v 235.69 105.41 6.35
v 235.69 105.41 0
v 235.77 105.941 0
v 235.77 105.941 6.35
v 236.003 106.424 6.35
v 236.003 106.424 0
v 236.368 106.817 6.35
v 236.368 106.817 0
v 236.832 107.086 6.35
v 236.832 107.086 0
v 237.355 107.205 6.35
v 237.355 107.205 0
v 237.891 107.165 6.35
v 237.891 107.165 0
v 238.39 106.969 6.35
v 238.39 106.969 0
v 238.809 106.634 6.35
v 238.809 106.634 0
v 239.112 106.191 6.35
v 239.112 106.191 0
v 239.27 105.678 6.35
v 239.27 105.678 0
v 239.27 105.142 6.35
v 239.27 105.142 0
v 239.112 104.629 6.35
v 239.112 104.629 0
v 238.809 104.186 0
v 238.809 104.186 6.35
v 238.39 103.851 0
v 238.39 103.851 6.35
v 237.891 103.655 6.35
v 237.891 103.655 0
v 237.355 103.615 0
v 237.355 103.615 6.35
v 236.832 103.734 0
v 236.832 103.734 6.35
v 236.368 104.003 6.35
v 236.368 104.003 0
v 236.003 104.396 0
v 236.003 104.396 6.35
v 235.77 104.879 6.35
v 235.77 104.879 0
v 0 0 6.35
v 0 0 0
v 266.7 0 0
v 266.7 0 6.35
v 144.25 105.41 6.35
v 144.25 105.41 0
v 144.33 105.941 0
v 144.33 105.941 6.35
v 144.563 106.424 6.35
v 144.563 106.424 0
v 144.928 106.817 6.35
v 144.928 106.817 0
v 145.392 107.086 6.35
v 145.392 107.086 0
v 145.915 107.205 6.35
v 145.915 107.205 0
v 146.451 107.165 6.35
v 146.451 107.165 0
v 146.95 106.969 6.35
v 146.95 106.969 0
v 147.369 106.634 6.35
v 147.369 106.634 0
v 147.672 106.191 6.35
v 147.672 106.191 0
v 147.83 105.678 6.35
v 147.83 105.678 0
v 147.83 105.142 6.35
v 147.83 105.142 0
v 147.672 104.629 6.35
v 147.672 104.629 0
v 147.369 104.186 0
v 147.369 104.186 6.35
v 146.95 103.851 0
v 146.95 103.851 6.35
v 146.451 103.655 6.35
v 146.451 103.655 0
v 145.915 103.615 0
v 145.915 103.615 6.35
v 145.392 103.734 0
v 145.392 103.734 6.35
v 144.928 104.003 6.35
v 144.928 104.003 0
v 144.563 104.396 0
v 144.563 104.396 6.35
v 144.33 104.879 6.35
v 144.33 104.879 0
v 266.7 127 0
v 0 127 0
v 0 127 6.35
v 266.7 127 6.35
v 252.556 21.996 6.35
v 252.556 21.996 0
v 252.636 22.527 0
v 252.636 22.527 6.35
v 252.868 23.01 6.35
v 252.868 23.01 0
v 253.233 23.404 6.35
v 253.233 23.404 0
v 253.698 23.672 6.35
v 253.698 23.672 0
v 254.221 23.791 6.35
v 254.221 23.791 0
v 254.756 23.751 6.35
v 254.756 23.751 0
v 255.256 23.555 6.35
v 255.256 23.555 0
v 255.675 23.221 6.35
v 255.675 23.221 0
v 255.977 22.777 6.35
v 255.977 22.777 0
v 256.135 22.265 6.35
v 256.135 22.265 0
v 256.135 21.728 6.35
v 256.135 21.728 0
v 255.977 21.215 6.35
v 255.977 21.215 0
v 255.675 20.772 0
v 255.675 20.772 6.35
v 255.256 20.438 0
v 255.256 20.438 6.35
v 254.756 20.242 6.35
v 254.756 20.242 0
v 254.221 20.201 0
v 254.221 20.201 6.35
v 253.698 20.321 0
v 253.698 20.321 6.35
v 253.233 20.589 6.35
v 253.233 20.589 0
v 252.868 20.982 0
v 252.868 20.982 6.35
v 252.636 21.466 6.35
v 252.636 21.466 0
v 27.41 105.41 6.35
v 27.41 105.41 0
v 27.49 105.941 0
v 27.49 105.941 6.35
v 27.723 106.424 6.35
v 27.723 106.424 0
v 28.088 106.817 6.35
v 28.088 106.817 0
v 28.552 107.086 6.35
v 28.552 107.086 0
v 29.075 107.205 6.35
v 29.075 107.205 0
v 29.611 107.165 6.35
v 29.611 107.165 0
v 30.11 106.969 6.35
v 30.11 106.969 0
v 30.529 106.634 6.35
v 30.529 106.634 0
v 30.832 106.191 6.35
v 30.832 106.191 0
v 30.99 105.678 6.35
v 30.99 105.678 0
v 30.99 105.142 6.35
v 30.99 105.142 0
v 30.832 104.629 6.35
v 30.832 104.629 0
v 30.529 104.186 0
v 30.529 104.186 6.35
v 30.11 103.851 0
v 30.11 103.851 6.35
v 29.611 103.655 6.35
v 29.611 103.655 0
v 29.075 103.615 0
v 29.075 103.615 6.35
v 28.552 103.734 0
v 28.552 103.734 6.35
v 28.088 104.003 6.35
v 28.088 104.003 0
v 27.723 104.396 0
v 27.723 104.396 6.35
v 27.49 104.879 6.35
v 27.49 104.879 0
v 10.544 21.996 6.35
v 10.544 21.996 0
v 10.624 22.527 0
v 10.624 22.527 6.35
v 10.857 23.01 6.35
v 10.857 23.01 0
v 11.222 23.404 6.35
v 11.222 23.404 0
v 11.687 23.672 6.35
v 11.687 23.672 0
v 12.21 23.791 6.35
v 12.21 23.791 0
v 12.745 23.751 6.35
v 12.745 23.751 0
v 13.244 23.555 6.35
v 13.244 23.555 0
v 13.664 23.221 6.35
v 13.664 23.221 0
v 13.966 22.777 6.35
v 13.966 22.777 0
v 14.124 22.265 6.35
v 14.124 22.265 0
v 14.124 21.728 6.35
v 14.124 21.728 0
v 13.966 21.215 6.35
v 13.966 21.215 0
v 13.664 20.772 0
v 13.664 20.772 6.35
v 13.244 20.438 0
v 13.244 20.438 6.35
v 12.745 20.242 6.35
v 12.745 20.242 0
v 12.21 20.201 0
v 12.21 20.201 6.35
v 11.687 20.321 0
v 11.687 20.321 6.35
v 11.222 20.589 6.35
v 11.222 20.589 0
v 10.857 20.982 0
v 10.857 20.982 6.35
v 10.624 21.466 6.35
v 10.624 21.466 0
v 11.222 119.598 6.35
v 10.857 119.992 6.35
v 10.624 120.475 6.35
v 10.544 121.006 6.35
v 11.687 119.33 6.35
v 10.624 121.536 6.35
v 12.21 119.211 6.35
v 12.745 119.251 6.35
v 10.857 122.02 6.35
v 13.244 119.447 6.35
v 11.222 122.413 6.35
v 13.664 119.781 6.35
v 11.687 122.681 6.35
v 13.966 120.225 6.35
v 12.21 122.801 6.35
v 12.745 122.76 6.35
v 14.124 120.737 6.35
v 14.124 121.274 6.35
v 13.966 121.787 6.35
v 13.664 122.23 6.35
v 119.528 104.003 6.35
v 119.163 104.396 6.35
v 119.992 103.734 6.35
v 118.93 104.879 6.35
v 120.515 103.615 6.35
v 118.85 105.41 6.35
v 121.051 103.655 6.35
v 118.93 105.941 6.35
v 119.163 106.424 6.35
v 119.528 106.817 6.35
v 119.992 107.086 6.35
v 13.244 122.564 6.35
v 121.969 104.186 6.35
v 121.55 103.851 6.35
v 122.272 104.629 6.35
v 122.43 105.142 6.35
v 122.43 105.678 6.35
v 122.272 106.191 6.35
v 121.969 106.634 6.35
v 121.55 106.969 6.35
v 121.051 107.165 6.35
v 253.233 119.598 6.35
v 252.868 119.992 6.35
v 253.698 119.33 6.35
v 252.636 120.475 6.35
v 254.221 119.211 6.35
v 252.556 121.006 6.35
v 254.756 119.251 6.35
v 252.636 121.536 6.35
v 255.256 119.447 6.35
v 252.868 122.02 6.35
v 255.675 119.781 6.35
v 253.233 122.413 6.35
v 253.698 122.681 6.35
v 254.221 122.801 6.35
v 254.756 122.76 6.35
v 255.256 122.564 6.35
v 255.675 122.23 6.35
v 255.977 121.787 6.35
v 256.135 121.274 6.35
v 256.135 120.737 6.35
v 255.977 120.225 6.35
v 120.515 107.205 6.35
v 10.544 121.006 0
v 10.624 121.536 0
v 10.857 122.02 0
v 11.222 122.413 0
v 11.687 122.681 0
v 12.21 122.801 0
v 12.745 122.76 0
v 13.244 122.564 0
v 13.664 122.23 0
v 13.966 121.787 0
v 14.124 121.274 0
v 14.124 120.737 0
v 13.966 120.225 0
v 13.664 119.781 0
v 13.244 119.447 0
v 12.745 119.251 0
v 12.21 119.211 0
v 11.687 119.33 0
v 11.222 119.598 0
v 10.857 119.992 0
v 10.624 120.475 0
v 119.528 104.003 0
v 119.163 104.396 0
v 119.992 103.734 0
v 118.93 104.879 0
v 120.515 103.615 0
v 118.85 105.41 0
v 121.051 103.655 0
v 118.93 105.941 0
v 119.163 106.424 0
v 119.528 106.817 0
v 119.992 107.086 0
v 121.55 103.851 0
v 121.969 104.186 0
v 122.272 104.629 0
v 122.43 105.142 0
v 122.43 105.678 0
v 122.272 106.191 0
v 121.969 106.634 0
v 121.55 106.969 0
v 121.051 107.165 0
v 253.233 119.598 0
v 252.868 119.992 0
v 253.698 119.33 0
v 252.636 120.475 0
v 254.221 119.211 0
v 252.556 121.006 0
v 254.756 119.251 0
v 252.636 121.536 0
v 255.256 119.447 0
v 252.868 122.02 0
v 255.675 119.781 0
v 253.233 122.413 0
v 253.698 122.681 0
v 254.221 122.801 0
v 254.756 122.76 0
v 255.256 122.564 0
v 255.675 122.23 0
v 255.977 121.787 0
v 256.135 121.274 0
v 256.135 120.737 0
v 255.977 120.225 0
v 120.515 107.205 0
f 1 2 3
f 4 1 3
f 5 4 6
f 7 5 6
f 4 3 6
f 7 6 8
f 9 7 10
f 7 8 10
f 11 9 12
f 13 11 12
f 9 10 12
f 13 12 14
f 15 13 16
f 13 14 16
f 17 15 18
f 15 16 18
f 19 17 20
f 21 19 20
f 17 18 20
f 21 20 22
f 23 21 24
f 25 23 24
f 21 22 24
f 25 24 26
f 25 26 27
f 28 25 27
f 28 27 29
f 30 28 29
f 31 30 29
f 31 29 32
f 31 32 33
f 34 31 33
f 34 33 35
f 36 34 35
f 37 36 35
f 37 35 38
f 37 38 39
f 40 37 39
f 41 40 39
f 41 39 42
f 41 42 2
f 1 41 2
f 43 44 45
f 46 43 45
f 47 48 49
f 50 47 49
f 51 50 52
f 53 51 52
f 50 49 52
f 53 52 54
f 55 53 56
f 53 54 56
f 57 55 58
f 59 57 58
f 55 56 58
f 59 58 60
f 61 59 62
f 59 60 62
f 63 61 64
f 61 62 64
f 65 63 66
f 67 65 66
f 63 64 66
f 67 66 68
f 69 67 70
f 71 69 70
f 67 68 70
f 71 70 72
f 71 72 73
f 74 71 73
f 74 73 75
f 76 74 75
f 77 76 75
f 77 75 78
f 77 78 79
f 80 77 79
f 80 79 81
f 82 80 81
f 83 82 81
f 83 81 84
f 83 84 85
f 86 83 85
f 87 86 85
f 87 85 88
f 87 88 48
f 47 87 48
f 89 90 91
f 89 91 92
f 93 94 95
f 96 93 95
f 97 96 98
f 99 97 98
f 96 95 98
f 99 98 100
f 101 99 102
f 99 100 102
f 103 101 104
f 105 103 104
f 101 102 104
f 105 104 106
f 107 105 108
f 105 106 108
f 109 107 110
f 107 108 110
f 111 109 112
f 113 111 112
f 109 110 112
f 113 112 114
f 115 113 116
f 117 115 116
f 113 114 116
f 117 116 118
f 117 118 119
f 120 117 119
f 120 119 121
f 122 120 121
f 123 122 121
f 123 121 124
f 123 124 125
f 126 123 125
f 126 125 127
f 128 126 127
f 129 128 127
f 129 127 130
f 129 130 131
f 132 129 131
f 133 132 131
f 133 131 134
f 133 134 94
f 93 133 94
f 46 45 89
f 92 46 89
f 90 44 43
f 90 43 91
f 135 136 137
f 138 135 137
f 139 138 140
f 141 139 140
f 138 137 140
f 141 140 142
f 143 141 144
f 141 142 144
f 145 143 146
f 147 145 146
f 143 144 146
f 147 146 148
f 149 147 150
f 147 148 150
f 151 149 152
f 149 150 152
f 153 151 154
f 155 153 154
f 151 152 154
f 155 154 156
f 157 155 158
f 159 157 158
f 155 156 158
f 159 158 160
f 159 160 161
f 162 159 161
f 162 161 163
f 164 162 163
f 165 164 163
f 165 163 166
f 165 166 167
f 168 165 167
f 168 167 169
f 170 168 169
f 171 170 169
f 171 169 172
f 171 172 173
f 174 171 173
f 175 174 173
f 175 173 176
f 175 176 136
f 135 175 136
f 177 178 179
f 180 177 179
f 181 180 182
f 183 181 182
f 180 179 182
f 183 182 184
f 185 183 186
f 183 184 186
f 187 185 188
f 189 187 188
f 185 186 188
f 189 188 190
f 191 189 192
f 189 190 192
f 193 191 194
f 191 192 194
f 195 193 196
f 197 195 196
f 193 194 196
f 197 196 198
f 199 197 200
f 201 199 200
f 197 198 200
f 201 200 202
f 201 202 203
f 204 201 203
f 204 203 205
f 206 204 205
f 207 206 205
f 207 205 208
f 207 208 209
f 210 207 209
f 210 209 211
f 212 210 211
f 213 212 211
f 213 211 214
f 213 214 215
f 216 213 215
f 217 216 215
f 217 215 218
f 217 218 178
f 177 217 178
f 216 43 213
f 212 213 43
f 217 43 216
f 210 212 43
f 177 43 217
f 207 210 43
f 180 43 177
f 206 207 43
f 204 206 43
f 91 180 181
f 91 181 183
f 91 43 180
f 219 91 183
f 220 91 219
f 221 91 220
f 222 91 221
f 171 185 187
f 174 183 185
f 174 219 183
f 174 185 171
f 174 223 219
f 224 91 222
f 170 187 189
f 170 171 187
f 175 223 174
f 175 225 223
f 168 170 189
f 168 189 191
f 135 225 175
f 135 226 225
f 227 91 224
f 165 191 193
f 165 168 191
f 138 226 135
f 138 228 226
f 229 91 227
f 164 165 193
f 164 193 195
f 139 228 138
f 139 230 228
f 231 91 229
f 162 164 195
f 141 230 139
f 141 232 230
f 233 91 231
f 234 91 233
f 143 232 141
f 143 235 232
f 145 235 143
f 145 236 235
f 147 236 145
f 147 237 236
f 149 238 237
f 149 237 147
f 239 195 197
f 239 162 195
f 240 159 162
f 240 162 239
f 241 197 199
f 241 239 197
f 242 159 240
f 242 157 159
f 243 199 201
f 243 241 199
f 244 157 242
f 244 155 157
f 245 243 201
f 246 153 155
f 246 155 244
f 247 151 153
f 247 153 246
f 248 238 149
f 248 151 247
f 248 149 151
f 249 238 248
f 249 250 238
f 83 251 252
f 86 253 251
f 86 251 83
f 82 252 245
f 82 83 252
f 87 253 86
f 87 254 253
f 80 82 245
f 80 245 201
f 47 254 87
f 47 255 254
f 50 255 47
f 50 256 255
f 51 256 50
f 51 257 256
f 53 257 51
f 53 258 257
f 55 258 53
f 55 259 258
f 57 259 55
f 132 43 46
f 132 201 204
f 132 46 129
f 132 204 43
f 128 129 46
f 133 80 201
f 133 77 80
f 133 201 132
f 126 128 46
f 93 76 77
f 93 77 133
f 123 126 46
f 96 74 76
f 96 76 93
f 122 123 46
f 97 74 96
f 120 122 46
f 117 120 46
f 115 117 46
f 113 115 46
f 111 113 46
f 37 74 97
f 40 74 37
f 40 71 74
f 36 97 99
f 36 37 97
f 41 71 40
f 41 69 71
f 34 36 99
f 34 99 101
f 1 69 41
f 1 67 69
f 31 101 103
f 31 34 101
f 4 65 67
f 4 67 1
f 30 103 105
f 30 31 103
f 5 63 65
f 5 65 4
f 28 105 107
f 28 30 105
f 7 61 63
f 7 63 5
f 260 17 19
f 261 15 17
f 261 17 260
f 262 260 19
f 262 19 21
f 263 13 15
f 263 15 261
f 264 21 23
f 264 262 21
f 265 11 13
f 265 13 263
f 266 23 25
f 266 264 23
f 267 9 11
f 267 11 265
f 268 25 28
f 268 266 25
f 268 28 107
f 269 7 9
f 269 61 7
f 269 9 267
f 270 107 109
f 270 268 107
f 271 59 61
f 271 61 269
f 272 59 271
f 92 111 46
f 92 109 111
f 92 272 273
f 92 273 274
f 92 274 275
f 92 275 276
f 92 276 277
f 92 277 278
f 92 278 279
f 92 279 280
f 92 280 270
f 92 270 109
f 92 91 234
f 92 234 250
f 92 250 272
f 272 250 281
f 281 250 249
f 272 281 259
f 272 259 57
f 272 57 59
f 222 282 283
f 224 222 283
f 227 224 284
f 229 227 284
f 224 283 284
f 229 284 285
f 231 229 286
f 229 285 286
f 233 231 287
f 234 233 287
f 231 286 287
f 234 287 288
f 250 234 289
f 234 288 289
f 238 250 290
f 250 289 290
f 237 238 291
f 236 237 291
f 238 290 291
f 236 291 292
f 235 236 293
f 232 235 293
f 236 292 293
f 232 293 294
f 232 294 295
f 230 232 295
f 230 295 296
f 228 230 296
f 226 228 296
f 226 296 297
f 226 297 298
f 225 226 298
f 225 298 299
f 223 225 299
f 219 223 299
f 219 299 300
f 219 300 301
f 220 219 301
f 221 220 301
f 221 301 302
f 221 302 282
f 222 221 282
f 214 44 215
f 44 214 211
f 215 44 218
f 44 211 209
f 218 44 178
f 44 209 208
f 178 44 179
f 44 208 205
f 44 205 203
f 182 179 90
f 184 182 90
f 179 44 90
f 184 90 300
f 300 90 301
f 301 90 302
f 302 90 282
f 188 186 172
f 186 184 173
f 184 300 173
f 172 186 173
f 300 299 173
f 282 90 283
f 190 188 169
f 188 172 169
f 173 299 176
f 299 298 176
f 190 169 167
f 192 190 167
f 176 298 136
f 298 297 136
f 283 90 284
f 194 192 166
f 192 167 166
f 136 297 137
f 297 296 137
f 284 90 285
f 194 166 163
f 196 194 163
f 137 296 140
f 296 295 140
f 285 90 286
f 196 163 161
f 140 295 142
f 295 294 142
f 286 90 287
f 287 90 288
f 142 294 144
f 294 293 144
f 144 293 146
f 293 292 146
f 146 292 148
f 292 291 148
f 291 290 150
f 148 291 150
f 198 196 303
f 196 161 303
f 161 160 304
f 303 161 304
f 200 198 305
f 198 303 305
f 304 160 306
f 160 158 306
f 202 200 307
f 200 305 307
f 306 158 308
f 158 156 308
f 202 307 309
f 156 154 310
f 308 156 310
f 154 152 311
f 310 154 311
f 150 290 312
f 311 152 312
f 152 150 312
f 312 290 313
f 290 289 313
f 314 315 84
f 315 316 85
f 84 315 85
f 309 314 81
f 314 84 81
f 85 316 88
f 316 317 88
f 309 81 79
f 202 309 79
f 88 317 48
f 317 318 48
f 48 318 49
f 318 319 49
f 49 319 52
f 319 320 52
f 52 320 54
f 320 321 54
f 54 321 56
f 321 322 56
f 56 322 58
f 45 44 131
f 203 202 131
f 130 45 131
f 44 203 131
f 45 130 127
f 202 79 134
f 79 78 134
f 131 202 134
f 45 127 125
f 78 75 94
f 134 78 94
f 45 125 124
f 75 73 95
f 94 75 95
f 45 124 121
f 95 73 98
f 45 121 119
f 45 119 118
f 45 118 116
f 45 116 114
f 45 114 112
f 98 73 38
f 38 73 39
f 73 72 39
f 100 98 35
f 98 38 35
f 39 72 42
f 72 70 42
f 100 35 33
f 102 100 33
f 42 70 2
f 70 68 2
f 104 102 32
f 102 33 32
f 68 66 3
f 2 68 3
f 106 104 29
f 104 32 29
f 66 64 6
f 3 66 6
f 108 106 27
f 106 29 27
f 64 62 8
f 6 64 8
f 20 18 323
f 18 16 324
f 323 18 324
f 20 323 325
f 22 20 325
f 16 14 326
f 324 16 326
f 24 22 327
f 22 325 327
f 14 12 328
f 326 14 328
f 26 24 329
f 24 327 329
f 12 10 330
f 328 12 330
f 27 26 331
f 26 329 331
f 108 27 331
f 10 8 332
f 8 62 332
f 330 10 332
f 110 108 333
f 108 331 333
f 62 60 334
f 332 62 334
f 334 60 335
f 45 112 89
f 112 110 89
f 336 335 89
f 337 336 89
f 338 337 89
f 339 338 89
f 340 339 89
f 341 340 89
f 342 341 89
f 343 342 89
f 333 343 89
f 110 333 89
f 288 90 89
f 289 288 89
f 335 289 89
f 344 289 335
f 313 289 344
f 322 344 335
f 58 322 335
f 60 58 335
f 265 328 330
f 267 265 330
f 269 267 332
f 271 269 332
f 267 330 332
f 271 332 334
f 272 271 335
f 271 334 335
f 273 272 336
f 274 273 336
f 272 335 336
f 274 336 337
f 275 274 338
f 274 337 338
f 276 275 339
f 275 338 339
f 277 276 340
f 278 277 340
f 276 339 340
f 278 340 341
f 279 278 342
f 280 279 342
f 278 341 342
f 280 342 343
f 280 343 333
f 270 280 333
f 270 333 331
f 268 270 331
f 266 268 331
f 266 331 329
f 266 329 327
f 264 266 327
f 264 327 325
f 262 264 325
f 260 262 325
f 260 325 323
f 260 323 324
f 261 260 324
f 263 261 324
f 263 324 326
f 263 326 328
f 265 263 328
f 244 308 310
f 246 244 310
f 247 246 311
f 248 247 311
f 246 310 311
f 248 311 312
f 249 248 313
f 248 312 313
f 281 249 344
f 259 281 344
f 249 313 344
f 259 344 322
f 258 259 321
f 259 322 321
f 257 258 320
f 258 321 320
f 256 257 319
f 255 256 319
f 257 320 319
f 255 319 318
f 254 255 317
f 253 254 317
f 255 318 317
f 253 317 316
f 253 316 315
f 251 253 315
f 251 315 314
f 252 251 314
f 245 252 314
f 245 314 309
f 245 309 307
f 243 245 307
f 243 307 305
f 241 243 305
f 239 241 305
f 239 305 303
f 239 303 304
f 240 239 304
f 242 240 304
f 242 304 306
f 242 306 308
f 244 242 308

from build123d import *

# Parameters (mm, degrees)
SKETCH1_W            = 266.7
SKETCH1_H            = 127
BOSS_EXTRUDE1_DEPTH  = 6.35
M3_CLEARANCE_HOLE1_D = 3.6
M3_CLEARANCE_HOLE2_D = 3.6


with BuildPart() as part:
    # Sketch1 → Boss-Extrude1 (new body)
    with BuildSketch(Plane.XY):
        with Locations((133.35, 63.5)):
            Rectangle(SKETCH1_W, SKETCH1_H)
    extrude(amount=BOSS_EXTRUDE1_DEPTH)

    # M3 Clearance Hole1 (through all)
    with Locations(Plane.XY.offset(6.35)):
        with Locations((12.3444, 121.0056), (12.3444, 21.9964), (254.3556, 21.9964), (254.3556, 121.0056)):
            Hole(M3_CLEARANCE_HOLE1_D / 2)

    # M3 Clearance Hole2 (through all)
    with Locations(Plane.XY.offset(6.35)):
        with Locations((29.21, 105.41), (120.65, 105.41), (146.05, 105.41), (237.49, 105.41)):
            Hole(M3_CLEARANCE_HOLE2_D / 2)


solid = part.part
